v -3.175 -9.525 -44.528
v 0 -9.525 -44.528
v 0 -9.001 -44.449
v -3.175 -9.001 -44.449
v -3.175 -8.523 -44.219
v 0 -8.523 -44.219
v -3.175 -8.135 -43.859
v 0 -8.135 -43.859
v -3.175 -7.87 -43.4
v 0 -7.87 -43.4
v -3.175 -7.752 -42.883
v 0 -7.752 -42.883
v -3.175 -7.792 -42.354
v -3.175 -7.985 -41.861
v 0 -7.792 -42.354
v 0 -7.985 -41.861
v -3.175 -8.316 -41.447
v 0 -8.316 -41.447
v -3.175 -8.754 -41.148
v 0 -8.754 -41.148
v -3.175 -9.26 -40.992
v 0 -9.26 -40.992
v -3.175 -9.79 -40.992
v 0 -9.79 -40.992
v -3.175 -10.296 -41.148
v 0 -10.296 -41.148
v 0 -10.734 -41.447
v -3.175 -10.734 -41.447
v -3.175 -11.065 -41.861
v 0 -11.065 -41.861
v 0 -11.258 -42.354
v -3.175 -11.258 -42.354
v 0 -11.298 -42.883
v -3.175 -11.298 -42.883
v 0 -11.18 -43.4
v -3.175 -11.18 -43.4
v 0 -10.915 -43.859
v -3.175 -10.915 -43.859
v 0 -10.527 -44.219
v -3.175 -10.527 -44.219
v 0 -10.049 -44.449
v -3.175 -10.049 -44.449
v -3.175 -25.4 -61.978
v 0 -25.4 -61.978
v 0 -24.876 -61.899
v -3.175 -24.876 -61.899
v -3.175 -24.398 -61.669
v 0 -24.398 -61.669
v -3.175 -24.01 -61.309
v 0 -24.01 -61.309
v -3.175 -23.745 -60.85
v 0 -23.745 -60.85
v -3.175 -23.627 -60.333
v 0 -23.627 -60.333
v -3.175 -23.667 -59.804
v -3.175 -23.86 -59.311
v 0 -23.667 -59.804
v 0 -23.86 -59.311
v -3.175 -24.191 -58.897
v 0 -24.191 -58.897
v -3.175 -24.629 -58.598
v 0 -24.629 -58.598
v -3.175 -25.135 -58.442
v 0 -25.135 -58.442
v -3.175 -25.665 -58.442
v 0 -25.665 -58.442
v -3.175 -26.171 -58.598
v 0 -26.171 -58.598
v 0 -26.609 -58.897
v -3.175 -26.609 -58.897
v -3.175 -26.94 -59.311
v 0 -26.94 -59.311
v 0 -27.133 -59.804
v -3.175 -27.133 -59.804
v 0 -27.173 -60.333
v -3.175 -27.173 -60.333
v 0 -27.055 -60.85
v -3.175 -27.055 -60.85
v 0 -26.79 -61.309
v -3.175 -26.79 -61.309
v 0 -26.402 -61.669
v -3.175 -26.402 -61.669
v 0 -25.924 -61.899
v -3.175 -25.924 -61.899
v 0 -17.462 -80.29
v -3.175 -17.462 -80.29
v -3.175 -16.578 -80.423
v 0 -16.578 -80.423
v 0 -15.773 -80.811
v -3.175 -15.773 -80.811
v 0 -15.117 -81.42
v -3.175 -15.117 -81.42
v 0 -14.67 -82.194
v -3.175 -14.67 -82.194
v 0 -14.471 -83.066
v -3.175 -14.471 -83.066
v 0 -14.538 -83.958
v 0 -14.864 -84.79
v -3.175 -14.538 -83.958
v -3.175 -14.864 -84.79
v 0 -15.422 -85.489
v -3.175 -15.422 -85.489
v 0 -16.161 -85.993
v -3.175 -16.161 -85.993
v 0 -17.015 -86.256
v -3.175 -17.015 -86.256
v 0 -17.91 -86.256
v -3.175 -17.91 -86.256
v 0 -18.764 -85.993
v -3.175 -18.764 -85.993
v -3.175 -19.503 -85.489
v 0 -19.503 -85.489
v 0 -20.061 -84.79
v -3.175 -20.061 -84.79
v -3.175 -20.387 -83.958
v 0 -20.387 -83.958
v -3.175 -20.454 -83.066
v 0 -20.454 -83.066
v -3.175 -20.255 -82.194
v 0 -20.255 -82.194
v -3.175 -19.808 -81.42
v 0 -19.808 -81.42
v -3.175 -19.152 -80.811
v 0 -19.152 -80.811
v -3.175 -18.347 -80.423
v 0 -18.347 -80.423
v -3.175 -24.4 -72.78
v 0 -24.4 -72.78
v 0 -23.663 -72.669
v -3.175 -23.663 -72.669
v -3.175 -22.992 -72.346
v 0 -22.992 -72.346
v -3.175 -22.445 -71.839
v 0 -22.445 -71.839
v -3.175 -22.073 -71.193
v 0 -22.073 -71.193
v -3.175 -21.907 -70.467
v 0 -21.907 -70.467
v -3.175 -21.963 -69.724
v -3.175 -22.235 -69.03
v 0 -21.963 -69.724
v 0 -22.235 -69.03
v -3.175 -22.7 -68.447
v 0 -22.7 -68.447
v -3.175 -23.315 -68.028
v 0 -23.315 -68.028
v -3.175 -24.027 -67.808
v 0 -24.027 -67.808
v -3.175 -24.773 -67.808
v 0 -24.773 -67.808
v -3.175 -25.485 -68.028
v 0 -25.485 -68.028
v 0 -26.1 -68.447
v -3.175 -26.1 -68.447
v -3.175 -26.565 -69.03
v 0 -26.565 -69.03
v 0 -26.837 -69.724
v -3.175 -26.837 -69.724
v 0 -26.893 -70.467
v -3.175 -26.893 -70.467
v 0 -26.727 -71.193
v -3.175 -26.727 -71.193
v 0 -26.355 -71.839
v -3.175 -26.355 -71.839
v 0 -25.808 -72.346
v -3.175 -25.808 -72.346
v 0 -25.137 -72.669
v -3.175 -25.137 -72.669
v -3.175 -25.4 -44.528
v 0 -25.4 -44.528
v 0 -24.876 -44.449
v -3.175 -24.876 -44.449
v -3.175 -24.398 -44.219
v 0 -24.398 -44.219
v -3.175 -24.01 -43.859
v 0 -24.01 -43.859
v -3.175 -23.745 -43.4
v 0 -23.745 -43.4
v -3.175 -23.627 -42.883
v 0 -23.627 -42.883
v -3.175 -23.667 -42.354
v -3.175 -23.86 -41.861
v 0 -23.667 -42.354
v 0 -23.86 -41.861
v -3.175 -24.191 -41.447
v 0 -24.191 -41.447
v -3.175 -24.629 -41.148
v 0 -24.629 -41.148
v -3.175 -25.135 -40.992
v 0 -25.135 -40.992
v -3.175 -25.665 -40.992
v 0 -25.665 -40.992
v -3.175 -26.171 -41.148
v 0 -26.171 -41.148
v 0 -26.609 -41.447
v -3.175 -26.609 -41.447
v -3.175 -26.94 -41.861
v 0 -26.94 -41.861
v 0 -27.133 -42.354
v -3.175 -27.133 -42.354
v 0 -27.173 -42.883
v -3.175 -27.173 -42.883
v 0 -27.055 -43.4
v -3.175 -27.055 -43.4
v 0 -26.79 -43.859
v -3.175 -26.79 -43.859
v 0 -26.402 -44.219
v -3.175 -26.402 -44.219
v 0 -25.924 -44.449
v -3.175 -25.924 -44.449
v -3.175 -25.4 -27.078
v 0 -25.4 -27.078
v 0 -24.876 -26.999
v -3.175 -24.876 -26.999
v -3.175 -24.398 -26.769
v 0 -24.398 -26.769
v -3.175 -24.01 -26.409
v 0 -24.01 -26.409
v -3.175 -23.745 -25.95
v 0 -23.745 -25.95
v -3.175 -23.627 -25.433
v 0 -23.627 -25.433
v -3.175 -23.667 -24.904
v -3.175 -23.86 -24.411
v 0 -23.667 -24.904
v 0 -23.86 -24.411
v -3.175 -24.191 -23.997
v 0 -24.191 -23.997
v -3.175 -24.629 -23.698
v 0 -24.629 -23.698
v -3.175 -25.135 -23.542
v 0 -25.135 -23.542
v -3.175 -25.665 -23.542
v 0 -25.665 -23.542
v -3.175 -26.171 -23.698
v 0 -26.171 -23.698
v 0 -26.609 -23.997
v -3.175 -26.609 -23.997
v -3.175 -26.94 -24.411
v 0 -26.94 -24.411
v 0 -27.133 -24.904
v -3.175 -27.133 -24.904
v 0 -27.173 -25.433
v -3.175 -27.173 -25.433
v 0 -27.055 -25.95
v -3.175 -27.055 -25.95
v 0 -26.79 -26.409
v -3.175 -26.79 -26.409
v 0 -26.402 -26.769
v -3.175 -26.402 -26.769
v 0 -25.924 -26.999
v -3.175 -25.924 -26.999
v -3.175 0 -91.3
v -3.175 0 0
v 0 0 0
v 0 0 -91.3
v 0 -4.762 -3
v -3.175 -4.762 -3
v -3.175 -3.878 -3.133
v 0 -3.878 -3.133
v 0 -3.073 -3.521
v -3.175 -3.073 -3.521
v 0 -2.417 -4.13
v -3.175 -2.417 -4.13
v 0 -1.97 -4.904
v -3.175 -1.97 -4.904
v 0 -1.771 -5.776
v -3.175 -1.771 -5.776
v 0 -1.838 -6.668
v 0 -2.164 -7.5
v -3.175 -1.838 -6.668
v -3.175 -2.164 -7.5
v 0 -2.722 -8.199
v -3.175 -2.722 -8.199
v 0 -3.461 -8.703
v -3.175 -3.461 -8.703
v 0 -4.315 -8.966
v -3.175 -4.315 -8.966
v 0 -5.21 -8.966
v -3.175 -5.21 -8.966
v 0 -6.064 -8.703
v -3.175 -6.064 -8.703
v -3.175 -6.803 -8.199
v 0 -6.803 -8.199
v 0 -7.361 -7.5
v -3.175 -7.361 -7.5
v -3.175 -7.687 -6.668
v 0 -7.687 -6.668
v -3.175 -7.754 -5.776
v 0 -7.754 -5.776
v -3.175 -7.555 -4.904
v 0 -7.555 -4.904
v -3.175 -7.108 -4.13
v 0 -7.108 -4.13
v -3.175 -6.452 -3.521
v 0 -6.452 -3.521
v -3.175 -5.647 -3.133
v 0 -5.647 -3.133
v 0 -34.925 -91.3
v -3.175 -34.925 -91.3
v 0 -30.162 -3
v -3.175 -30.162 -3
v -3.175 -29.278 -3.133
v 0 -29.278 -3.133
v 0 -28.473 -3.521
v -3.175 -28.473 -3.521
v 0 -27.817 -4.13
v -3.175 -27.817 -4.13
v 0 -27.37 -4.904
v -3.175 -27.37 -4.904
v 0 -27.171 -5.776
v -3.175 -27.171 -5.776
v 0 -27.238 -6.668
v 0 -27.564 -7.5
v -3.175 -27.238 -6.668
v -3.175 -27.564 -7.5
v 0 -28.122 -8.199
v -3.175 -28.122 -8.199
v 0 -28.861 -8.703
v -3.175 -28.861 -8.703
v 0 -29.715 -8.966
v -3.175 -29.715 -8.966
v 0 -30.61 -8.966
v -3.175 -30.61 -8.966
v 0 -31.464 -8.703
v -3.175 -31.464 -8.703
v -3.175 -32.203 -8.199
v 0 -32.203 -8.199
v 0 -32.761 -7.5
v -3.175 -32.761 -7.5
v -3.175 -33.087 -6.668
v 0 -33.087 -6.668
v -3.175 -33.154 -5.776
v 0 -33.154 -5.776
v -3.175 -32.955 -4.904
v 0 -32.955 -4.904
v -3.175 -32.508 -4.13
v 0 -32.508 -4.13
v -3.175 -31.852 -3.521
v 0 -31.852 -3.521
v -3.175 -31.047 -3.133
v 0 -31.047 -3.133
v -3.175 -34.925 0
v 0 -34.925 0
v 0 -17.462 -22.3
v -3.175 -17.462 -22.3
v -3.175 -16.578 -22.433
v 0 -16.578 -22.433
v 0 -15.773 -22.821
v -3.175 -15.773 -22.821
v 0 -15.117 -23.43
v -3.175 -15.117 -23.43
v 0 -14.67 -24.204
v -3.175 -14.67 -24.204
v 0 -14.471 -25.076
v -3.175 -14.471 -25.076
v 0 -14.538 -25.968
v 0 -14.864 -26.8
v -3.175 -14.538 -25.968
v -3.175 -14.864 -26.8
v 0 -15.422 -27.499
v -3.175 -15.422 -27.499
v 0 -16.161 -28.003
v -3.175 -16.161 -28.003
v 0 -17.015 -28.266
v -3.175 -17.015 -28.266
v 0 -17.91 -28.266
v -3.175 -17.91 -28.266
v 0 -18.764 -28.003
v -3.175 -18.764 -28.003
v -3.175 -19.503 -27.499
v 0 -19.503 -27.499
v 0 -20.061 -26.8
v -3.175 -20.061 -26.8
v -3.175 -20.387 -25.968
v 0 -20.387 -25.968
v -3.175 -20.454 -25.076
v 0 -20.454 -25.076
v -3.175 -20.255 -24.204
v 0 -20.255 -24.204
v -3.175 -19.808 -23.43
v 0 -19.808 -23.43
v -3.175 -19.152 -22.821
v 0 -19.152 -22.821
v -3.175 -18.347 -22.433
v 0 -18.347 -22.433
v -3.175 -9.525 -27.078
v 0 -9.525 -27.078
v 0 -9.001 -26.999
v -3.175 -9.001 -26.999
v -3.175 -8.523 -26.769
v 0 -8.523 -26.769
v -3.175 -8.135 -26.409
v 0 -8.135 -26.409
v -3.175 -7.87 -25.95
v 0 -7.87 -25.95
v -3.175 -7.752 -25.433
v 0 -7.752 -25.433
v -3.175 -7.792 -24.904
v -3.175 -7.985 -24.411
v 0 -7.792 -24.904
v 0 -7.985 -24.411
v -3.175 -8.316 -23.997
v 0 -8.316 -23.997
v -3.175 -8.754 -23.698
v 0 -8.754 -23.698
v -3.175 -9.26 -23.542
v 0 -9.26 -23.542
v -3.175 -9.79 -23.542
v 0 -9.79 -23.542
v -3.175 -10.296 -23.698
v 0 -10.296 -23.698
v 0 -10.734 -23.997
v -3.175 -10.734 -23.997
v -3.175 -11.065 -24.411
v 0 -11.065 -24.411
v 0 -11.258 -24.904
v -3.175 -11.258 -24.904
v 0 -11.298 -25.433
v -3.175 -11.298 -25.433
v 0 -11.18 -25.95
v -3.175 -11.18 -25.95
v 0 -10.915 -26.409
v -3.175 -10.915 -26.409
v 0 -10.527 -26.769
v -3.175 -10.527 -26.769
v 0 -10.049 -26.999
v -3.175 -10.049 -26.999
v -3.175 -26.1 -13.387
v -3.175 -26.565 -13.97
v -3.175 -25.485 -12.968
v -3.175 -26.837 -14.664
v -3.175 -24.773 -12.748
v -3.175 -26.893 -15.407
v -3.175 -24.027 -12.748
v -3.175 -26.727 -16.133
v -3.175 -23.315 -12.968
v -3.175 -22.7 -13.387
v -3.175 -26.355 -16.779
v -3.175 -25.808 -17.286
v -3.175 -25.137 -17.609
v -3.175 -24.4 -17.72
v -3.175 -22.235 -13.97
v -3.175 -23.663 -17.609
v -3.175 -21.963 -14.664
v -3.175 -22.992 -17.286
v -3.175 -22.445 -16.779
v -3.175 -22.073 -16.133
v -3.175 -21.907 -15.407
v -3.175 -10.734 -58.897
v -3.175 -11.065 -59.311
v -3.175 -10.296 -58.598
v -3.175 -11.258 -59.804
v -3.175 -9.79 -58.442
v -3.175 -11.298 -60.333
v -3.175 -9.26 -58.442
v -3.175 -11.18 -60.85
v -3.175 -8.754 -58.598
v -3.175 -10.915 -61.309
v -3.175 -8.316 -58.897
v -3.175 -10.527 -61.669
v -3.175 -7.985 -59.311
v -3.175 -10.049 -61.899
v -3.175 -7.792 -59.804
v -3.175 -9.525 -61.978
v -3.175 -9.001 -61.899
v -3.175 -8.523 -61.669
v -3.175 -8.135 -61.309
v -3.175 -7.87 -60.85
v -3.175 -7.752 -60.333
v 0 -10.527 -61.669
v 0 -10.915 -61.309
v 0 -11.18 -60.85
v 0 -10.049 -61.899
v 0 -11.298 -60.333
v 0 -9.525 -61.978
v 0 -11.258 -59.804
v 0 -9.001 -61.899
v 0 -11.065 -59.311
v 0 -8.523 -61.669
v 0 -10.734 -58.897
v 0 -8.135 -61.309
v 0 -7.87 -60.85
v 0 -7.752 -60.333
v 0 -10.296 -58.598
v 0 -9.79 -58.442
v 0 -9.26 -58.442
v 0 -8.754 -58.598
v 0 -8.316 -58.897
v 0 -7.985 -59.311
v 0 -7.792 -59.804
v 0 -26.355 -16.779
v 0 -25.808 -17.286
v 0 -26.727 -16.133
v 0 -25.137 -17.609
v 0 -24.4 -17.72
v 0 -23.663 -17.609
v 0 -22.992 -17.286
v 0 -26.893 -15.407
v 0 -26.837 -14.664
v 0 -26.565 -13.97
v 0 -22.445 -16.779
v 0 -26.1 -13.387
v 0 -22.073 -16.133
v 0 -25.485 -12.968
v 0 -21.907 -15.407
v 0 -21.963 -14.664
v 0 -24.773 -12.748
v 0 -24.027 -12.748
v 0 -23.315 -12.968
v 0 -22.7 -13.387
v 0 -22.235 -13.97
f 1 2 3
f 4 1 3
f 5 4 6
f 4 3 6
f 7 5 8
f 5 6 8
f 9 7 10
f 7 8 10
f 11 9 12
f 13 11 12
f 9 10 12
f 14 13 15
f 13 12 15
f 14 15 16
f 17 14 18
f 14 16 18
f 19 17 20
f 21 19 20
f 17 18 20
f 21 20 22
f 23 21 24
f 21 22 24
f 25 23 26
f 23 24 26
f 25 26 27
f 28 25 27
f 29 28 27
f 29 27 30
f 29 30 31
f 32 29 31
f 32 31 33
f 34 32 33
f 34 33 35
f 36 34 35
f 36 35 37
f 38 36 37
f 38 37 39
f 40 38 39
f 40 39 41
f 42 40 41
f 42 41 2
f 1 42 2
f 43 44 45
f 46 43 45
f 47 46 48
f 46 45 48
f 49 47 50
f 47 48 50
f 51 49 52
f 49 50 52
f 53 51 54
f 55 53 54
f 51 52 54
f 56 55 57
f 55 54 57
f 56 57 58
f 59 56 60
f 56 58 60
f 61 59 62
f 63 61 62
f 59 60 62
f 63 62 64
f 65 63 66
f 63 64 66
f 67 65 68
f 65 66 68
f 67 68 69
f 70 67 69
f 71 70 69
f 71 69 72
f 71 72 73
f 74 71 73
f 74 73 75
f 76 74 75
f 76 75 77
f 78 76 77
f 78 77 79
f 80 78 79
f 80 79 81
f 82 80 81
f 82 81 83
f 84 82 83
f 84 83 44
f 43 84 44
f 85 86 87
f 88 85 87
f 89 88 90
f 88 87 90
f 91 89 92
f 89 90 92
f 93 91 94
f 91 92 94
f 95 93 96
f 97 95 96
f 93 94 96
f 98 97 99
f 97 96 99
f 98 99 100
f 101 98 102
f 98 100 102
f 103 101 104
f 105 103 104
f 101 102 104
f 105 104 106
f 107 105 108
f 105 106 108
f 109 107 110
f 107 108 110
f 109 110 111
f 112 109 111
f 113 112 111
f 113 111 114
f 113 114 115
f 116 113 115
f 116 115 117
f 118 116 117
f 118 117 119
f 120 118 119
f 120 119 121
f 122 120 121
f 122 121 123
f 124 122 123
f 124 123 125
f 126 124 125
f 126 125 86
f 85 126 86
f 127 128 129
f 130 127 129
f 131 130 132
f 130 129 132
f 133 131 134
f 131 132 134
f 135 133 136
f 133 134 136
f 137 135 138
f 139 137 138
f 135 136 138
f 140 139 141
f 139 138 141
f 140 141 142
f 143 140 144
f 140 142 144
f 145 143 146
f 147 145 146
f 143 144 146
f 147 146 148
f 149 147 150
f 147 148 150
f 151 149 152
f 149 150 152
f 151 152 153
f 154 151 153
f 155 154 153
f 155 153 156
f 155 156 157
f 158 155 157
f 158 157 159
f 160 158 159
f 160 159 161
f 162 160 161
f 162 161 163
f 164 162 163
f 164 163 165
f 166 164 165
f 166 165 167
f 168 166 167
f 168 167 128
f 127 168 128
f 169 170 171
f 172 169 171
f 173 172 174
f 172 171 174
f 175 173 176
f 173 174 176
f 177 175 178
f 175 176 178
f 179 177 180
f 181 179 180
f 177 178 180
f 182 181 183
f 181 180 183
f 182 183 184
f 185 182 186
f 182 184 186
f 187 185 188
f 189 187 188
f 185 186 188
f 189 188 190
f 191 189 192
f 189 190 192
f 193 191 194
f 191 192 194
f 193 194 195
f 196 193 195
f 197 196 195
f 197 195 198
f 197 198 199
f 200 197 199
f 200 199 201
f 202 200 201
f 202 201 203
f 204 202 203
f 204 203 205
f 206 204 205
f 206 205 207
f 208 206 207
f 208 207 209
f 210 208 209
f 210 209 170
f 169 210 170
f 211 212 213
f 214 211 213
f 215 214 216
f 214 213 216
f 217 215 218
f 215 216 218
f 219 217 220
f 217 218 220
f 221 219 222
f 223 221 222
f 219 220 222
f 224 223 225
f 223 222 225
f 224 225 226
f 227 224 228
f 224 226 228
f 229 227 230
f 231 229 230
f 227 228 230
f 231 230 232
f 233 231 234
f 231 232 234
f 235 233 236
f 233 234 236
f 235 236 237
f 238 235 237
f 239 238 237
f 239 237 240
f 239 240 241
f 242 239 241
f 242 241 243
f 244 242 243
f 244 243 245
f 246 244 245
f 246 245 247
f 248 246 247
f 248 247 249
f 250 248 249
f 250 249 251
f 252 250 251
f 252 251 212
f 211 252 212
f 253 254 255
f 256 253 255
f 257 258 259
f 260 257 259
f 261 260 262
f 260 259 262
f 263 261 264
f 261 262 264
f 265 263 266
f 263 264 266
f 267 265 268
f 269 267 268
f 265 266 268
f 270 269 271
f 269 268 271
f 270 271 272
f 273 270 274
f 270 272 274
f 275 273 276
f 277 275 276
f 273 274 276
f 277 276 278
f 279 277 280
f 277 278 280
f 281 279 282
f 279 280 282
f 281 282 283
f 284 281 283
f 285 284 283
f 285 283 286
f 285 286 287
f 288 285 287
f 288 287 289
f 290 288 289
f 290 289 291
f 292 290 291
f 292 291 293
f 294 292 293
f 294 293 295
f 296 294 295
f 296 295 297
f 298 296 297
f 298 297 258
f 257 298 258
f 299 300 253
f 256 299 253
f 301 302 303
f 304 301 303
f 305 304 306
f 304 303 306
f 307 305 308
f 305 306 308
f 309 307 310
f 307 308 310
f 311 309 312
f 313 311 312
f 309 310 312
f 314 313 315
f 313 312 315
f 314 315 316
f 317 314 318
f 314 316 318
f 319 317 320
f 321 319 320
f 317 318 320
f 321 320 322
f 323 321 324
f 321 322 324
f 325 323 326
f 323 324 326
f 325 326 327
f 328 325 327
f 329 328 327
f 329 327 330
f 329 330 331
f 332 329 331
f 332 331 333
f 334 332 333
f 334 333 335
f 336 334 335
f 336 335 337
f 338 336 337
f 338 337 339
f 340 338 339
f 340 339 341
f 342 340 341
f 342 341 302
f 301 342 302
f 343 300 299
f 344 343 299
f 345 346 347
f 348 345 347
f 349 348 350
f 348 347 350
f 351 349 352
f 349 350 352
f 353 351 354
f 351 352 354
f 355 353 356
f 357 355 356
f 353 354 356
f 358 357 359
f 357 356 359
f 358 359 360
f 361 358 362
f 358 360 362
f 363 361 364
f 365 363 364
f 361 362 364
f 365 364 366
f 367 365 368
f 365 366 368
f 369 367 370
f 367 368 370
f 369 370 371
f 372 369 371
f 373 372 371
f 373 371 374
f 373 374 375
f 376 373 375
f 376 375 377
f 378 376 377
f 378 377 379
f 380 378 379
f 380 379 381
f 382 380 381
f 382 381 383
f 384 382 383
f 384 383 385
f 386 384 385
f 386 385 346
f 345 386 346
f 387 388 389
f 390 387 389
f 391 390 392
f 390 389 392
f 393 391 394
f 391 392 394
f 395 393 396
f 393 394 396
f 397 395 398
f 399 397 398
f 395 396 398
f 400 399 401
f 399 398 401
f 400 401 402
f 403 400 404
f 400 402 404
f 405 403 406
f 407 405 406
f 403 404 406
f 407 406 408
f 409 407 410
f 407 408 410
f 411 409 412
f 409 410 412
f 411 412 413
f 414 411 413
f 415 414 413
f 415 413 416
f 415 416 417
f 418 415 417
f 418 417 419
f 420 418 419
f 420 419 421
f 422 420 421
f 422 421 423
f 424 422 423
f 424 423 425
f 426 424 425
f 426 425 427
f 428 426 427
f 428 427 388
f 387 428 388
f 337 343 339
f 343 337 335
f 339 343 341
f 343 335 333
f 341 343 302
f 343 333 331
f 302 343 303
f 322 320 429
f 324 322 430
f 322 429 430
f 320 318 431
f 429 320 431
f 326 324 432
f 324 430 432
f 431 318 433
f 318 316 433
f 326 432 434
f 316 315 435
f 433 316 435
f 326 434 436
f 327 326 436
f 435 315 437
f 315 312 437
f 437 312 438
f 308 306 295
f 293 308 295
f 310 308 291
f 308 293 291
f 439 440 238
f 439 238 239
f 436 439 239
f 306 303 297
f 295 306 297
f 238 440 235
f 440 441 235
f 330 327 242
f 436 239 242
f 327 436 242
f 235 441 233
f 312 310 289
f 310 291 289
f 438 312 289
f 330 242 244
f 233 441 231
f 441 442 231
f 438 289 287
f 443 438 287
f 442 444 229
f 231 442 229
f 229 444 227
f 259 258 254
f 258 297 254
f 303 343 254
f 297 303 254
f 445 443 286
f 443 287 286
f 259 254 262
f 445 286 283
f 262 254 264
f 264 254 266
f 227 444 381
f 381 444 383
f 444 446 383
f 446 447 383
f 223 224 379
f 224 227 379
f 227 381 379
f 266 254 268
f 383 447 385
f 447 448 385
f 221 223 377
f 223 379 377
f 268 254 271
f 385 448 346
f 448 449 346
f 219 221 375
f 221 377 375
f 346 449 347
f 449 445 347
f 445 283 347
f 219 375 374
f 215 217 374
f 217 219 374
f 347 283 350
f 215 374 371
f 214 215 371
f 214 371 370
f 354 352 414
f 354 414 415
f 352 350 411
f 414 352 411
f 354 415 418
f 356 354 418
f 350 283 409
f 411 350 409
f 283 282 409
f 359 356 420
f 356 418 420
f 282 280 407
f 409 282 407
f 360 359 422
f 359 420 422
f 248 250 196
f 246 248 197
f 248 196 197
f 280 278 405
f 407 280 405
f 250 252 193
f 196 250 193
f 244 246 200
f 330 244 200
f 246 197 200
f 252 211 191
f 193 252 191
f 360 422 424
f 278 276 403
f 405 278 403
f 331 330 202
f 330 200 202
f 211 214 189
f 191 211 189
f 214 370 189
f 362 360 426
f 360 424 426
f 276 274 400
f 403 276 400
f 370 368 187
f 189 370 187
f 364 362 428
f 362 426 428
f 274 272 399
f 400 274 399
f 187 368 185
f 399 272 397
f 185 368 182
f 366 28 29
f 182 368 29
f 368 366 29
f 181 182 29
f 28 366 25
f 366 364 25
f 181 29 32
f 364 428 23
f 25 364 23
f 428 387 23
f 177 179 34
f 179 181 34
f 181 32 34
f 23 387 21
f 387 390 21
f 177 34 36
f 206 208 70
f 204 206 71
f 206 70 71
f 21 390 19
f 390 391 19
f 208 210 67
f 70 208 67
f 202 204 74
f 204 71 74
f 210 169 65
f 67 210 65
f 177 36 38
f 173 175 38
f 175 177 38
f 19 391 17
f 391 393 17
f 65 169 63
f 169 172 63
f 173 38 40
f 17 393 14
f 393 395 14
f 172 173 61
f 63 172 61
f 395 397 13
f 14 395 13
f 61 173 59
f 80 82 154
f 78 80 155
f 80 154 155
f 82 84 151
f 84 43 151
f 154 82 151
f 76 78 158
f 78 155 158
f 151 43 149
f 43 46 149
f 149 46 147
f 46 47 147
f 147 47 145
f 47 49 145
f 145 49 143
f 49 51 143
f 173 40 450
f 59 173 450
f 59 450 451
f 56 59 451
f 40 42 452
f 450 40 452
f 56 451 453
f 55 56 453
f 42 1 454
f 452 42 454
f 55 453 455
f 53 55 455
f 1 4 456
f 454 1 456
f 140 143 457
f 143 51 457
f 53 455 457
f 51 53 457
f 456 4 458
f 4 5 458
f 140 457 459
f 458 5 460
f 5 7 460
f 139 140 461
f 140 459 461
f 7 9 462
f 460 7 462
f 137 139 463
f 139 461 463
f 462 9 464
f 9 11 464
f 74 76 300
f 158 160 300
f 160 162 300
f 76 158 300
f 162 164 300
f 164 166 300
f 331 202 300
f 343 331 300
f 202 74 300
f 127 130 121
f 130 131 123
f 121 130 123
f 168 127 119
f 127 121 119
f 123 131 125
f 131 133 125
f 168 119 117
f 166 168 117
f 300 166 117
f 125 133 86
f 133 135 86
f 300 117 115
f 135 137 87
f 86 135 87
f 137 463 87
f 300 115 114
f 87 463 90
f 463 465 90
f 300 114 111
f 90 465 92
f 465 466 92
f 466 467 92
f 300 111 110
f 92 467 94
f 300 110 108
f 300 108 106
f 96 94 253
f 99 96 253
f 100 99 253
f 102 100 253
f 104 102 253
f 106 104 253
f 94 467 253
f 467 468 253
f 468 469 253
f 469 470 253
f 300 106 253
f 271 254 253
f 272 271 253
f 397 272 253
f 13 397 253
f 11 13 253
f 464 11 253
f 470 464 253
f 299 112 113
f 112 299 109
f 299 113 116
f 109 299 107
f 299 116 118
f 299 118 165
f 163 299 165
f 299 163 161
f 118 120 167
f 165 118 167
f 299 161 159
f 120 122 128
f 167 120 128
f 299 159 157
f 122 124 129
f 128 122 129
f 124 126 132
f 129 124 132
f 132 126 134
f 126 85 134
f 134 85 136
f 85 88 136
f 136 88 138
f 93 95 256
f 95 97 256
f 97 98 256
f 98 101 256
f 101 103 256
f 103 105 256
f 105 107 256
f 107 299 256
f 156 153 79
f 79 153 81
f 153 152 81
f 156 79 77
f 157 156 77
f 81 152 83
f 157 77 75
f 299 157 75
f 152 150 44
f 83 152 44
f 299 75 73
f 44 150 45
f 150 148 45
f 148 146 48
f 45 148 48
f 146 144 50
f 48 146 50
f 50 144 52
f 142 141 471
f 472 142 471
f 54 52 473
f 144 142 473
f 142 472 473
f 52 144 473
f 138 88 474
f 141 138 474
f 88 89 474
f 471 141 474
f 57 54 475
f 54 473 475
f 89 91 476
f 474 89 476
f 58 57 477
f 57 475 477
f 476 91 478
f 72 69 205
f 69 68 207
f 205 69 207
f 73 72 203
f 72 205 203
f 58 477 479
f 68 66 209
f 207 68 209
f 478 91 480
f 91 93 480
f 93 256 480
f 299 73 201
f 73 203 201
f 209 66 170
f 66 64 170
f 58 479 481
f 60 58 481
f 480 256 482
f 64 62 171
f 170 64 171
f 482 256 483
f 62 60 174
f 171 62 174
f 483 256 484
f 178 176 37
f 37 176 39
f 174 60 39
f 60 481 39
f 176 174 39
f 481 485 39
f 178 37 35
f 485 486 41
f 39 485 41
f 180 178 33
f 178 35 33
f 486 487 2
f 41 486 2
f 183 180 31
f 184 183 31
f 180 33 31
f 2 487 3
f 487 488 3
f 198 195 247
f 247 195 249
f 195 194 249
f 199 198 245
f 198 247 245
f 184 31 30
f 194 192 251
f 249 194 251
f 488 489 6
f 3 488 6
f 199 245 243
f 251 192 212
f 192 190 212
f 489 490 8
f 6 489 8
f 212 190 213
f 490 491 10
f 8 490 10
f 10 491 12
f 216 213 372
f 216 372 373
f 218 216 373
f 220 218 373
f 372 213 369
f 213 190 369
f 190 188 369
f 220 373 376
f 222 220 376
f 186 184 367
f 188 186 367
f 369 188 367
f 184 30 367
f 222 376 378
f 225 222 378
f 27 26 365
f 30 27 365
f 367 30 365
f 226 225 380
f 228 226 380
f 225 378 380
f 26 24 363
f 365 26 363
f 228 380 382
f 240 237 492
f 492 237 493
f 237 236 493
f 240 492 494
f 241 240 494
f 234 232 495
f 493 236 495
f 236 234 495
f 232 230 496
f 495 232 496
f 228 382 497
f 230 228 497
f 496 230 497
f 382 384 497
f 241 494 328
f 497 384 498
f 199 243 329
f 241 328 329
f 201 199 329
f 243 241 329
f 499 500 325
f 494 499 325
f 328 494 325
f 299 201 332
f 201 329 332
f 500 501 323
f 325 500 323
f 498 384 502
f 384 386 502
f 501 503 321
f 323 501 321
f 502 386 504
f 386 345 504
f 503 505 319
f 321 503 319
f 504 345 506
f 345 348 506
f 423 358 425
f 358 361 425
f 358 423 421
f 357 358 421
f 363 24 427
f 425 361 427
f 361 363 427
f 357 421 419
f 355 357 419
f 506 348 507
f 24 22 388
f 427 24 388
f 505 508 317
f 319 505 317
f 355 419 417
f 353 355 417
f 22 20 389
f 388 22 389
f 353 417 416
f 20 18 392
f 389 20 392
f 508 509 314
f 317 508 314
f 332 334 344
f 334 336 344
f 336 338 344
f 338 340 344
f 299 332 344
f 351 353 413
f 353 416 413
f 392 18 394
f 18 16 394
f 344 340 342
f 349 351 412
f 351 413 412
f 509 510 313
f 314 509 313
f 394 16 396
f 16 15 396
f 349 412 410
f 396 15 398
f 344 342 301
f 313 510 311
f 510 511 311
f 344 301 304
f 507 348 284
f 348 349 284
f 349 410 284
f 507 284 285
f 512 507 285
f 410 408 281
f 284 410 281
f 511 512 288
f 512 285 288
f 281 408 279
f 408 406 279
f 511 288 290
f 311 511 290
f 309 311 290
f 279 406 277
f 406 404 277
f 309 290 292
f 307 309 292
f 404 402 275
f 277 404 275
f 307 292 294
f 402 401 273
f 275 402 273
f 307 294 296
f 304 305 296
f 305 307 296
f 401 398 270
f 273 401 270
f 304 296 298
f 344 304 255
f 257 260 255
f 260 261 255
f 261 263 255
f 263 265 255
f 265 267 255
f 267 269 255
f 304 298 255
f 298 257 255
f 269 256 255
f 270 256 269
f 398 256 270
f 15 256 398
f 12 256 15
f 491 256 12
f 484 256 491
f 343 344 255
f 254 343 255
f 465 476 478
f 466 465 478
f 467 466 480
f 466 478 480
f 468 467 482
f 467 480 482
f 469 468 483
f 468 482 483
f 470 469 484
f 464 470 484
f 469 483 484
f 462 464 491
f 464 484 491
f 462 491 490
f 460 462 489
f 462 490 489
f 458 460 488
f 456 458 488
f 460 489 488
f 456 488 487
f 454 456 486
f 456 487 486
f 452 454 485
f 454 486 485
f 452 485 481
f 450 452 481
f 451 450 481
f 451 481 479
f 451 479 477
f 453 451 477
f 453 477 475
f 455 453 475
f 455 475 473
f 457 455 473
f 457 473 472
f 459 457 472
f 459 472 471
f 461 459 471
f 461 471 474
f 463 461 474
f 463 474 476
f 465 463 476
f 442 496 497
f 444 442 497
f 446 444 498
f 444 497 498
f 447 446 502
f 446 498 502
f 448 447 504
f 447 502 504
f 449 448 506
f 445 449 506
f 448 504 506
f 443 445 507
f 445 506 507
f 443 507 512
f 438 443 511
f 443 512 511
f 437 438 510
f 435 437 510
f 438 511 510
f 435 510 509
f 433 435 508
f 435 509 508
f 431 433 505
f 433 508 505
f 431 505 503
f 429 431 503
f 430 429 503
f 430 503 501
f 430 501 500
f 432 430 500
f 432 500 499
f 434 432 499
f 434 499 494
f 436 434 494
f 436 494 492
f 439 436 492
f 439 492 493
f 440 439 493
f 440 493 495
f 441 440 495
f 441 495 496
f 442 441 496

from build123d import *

# Parameters (mm, degrees)
SKETCH1_W                      = 38.1
SKETCH1_H                      = 120
BOSS_EXTRUDE1_DEPTH            = 38.1
SKETCH2_W                      = 34.925
SKETCH2_H                      = 34.925
CUT_EXTRUDE1_DEPTH             = 130.767142413
F_4_2_4_2_DIAMETER_HOLE1_D     = 4.2
F_6_0_6_DIAMETER_HOLE1_D       = 6
F_4_2_4_2_DIAMETER_HOLE2_D     = 4.2
F_4_2_4_2_DIAMETER_HOLE2_DEPTH = 38.1
F_6_0_6_DIAMETER_HOLE2_D       = 6
F_6_0_6_DIAMETER_HOLE2_DEPTH   = 38.1
F_6_0_6_DIAMETER_HOLE3_D       = 6
F_6_0_6_DIAMETER_HOLE3_DEPTH   = 38.1
F_4_2_4_2_DIAMETER_HOLE3_D     = 4.2
SKETCH15_R                     = 2.1
SKETCH15_R_2                   = 3
BOSS_EXTRUDE2_DEPTH            = 3.175
BOSS_EXTRUDE3_START            = -3.175
SKETCH16_R                     = 2.1
BOSS_EXTRUDE3_DEPTH            = 3.175
SKETCH18_W                     = 3.175
SKETCH18_H                     = 3.175
CUT_EXTRUDE2_DEPTH             = 130.767142413
CUT_EXTRUDE3_START             = -3.175
CUT_EXTRUDE3_OUTLINE_R         = 2.1
CUT_EXTRUDE3_DEPTH             = 3.175
BOSS_EXTRUDE4_START            = -3.175
BOSS_EXTRUDE4_OUTLINE_R        = 3
BOSS_EXTRUDE4_DEPTH            = 3.175
SKETCH19_R                     = 3
CUT_EXTRUDE4_DEPTH             = 121.228267267
BOSS_EXTRUDE5_START            = -3.175
SKETCH20_R                     = 2.1
SKETCH20_R_2                   = 3
BOSS_EXTRUDE5_DEPTH            = 3.175
SKETCH23_R                     = 1.778
SKETCH23_R_2                   = 2.5
CUT_EXTRUDE5_DEPTH             = 121.228267267
SKETCH24_W                     = 5
SKETCH24_H                     = 34.925
CUT_EXTRUDE6_DEPTH             = 121.228267267
CUT_EXTRUDE7_DEPTH             = 121.228267267
CUT_EXTRUDE7_DEPTH_BACK        = 121.228267267
SKETCH25_W                     = 23.7
SKETCH25_H                     = 34.925


# Read off the part's stored shape, not the designer's step: Cut-Extrude3, Boss-Extrude4
with BuildPart() as part:
    # Sketch1 → Boss-Extrude1 (new body)
    with BuildSketch(Plane.XZ.offset(34.925)):
        with Locations((15.875, -55)):
            Rectangle(SKETCH1_W, SKETCH1_H)
    extrude(amount=-BOSS_EXTRUDE1_DEPTH)

    # Sketch2 → Cut-Extrude1 (cut, through all)
    with BuildSketch(Plane(origin=(0, 0, -115), x_dir=(-1, 0, 0), z_dir=(0, 0, -1))):
        with Locations((-17.4625, -17.4625)):
            Rectangle(SKETCH2_W, SKETCH2_H)
    extrude(amount=-CUT_EXTRUDE1_DEPTH, mode=Mode.SUBTRACT)

    # Ø4.2 (4.2) Diameter Hole1 (through all)
    with Locations(Plane(origin=(0, 0, 0), x_dir=(-1, 0, 0), z_dir=(0, -1, 0))):
        with Locations((-5, 35.97), (-5, 91.03)):
            Hole(F_4_2_4_2_DIAMETER_HOLE1_D / 2)

    # Ø6.0 (6) Diameter Hole1 (through all)
    with Locations(Plane(origin=(0, 0, 0), x_dir=(-1, 0, 0), z_dir=(0, -1, 0))):
        with Locations((-22.225, 106.5), (-22.225, 46.5)):
            Hole(F_6_0_6_DIAMETER_HOLE1_D / 2)

    # Ø4.2 (4.2) Diameter Hole2
    with Locations(Plane(origin=(0, 3.175, 0), x_dir=(1, 0, 0), z_dir=(0, 1, 0))):
        with Locations((22.225, 33.5), (22.225, 93.5), (29.296067812, 100.571067812), (29.296067812, 26.428932188)):
            Hole(F_4_2_4_2_DIAMETER_HOLE2_D / 2, depth=F_4_2_4_2_DIAMETER_HOLE2_DEPTH)

    # Ø6.0 (6) Diameter Hole2
    with Locations(Plane(origin=(0, 3.175, 0), x_dir=(1, 0, 0), z_dir=(0, 1, 0))):
        with Locations((24.925, 6)):
            Hole(F_6_0_6_DIAMETER_HOLE2_D / 2, depth=F_6_0_6_DIAMETER_HOLE2_DEPTH)

    # Ø6.0 (6) Diameter Hole3
    with Locations(Plane.ZY.offset(3.175)):
        with Locations((-6, -24.925), (-106.5, -22.225), (-46.5, -22.225)):
            Hole(F_6_0_6_DIAMETER_HOLE3_D / 2, depth=F_6_0_6_DIAMETER_HOLE3_DEPTH)

    # Ø4.2 (4.2) Diameter Hole3 (through all)
    with Locations(Plane.ZY.offset(3.175)):
        with Locations((-93.5, -22.225), (-33.5, -22.225), (-35.97, -5), (-91.03, -5), (-100.571067812, -29.296067812), (-26.428932188, -29.296067812)):
            Hole(F_4_2_4_2_DIAMETER_HOLE3_D / 2)

    # Sketch15 → Boss-Extrude2 (add)
    with BuildSketch(Plane(origin=(0, 3.175, 0), x_dir=(1, 0, 0), z_dir=(0, 1, 0))):
        with Locations((29.296067812, 26.428932188)):
            Circle(SKETCH15_R)
        with Locations((29.296067812, 100.571067812)):
            Circle(SKETCH15_R)
        with Locations((22.225, 106.5)):
            Circle(SKETCH15_R_2)
        with Locations((22.225, 46.5)):
            Circle(SKETCH15_R_2)
        with Locations((5, 35.97)):
            Circle(SKETCH15_R)
        with Locations((5, 91.03)):
            Circle(SKETCH15_R)
    extrude(amount=-BOSS_EXTRUDE2_DEPTH)

    # Sketch16 → Boss-Extrude3 (add)
    with BuildSketch(Plane.ZY.offset(3.175).offset(BOSS_EXTRUDE3_START)):
        with Locations((-100.571067812, -29.296067812)):
            Circle(SKETCH16_R)
        with Locations((-26.428932188, -29.296067812)):
            Circle(SKETCH16_R)
        with Locations((-35.97, -5)):
            Circle(SKETCH16_R)
        with Locations((-91.03, -5)):
            Circle(SKETCH16_R)
    extrude(amount=BOSS_EXTRUDE3_DEPTH)

    # Sketch18 → Cut-Extrude2 (cut, through all)
    with BuildSketch(Plane.XY.offset(5)):
        with Locations((-1.5875, 1.5875)):
            Rectangle(SKETCH18_W, SKETCH18_H)
    extrude(amount=-CUT_EXTRUDE2_DEPTH, mode=Mode.SUBTRACT)


with BuildPart() as body_2:
    # of the pieces the cut leaves, the one that is kept (cut_extrude2_keep)
    add(part.part.solids().sort_by_distance((-3.175, -34.925, -115))[0])

    # Cut-Extrude3 outline → Cut-Extrude3 (cut)
    with BuildSketch(Plane.YZ.offset(CUT_EXTRUDE3_START)):
        with Locations((-5, -91.03)):
            Circle(CUT_EXTRUDE3_OUTLINE_R)
        with Locations((-5, -35.97)):
            Circle(CUT_EXTRUDE3_OUTLINE_R)
        with Locations((-29.296067812, -26.428932188)):
            Circle(CUT_EXTRUDE3_OUTLINE_R)
        with Locations((-29.296067812, -100.571067812)):
            Circle(CUT_EXTRUDE3_OUTLINE_R)
    extrude(amount=CUT_EXTRUDE3_DEPTH, mode=Mode.SUBTRACT)

    # Boss-Extrude4 outline → Boss-Extrude4 (add)
    with BuildSketch(Plane.YZ.offset(BOSS_EXTRUDE4_START)):
        with Locations((-22.225, -46.5)):
            Circle(BOSS_EXTRUDE4_OUTLINE_R)
        with Locations((-22.225, -106.5)):
            Circle(BOSS_EXTRUDE4_OUTLINE_R)
        with Locations((-24.925, -6)):
            Circle(BOSS_EXTRUDE4_OUTLINE_R)
    extrude(amount=BOSS_EXTRUDE4_DEPTH)

    # Sketch19 → Cut-Extrude4 (cut, through all)
    with BuildSketch(Plane.ZY.offset(3.175)):
        with Locations((-6, -4.7625)):
            Circle(SKETCH19_R)
        with Locations((-6, -30.1625)):
            Circle(SKETCH19_R)
        with Locations((-25.3, -17.4625)):
            Circle(SKETCH19_R)
        with Locations((-83.29, -17.4625)):
            Circle(SKETCH19_R)
    extrude(amount=-CUT_EXTRUDE4_DEPTH, mode=Mode.SUBTRACT)

    # Sketch20 → Boss-Extrude5 (add)
    with BuildSketch(Plane(origin=(0, 0, 0), x_dir=(0, 0, -1), z_dir=(1, 0, 0)).offset(BOSS_EXTRUDE5_START)):
        with Locations((26.428932188, -29.296067812)):
            Circle(SKETCH20_R)
        with Locations((33.8, -17.4625)):
            Circle(SKETCH20_R_2)
        with Locations((33.5, -22.225)):
            Circle(SKETCH20_R)
        with Locations((35.97, -5)):
            Circle(SKETCH20_R)
        with Locations((91.03, -5)):
            Circle(SKETCH20_R)
        with Locations((93.8, -17.4625)):
            Circle(SKETCH20_R_2)
        with Locations((93.5, -22.225)):
            Circle(SKETCH20_R)
        with Locations((100.571067812, -29.296067812)):
            Circle(SKETCH20_R)
    extrude(amount=BOSS_EXTRUDE5_DEPTH)

    # Sketch23 → Cut-Extrude5 (cut, through all)
    with BuildSketch(Plane(origin=(0, 0, 0), x_dir=(0, 0, -1), z_dir=(1, 0, 0))):
        with Locations((42.75, -9.525)):
            Circle(SKETCH23_R)
        with Locations((25.3, -9.525)):
            Circle(SKETCH23_R)
        with Locations((15.22, -24.4)):
            Circle(SKETCH23_R_2)
        with Locations((25.3, -25.4)):
            Circle(SKETCH23_R)
        with Locations((42.75, -25.4)):
            Circle(SKETCH23_R)
        with Locations((60.2, -9.525)):
            Circle(SKETCH23_R)
        with Locations((60.2, -25.4)):
            Circle(SKETCH23_R)
        with Locations((70.28, -24.4)):
            Circle(SKETCH23_R_2)
    extrude(amount=-CUT_EXTRUDE5_DEPTH, mode=Mode.SUBTRACT)

    # Sketch24 → Cut-Extrude6 (cut, through all)
    with BuildSketch(Plane(origin=(0, 0, 0), x_dir=(0, 0, -1), z_dir=(1, 0, 0))):
        with Locations((-2.5, -17.4625)):
            Rectangle(SKETCH24_W, SKETCH24_H)
    extrude(amount=-CUT_EXTRUDE6_DEPTH, mode=Mode.SUBTRACT)

    # Sketch25 → Cut-Extrude7 (cut, two sides: drawn at the far end of the back side and taken through both)
    with BuildSketch(Plane(origin=(0, 0, 0), x_dir=(0, 0, -1), z_dir=(1, 0, 0)).offset(-CUT_EXTRUDE7_DEPTH_BACK)):
        with Locations((103.15, -17.4625)):
            Rectangle(SKETCH25_W, SKETCH25_H)
    extrude(amount=CUT_EXTRUDE7_DEPTH + CUT_EXTRUDE7_DEPTH_BACK, mode=Mode.SUBTRACT)


solid = body_2.part
